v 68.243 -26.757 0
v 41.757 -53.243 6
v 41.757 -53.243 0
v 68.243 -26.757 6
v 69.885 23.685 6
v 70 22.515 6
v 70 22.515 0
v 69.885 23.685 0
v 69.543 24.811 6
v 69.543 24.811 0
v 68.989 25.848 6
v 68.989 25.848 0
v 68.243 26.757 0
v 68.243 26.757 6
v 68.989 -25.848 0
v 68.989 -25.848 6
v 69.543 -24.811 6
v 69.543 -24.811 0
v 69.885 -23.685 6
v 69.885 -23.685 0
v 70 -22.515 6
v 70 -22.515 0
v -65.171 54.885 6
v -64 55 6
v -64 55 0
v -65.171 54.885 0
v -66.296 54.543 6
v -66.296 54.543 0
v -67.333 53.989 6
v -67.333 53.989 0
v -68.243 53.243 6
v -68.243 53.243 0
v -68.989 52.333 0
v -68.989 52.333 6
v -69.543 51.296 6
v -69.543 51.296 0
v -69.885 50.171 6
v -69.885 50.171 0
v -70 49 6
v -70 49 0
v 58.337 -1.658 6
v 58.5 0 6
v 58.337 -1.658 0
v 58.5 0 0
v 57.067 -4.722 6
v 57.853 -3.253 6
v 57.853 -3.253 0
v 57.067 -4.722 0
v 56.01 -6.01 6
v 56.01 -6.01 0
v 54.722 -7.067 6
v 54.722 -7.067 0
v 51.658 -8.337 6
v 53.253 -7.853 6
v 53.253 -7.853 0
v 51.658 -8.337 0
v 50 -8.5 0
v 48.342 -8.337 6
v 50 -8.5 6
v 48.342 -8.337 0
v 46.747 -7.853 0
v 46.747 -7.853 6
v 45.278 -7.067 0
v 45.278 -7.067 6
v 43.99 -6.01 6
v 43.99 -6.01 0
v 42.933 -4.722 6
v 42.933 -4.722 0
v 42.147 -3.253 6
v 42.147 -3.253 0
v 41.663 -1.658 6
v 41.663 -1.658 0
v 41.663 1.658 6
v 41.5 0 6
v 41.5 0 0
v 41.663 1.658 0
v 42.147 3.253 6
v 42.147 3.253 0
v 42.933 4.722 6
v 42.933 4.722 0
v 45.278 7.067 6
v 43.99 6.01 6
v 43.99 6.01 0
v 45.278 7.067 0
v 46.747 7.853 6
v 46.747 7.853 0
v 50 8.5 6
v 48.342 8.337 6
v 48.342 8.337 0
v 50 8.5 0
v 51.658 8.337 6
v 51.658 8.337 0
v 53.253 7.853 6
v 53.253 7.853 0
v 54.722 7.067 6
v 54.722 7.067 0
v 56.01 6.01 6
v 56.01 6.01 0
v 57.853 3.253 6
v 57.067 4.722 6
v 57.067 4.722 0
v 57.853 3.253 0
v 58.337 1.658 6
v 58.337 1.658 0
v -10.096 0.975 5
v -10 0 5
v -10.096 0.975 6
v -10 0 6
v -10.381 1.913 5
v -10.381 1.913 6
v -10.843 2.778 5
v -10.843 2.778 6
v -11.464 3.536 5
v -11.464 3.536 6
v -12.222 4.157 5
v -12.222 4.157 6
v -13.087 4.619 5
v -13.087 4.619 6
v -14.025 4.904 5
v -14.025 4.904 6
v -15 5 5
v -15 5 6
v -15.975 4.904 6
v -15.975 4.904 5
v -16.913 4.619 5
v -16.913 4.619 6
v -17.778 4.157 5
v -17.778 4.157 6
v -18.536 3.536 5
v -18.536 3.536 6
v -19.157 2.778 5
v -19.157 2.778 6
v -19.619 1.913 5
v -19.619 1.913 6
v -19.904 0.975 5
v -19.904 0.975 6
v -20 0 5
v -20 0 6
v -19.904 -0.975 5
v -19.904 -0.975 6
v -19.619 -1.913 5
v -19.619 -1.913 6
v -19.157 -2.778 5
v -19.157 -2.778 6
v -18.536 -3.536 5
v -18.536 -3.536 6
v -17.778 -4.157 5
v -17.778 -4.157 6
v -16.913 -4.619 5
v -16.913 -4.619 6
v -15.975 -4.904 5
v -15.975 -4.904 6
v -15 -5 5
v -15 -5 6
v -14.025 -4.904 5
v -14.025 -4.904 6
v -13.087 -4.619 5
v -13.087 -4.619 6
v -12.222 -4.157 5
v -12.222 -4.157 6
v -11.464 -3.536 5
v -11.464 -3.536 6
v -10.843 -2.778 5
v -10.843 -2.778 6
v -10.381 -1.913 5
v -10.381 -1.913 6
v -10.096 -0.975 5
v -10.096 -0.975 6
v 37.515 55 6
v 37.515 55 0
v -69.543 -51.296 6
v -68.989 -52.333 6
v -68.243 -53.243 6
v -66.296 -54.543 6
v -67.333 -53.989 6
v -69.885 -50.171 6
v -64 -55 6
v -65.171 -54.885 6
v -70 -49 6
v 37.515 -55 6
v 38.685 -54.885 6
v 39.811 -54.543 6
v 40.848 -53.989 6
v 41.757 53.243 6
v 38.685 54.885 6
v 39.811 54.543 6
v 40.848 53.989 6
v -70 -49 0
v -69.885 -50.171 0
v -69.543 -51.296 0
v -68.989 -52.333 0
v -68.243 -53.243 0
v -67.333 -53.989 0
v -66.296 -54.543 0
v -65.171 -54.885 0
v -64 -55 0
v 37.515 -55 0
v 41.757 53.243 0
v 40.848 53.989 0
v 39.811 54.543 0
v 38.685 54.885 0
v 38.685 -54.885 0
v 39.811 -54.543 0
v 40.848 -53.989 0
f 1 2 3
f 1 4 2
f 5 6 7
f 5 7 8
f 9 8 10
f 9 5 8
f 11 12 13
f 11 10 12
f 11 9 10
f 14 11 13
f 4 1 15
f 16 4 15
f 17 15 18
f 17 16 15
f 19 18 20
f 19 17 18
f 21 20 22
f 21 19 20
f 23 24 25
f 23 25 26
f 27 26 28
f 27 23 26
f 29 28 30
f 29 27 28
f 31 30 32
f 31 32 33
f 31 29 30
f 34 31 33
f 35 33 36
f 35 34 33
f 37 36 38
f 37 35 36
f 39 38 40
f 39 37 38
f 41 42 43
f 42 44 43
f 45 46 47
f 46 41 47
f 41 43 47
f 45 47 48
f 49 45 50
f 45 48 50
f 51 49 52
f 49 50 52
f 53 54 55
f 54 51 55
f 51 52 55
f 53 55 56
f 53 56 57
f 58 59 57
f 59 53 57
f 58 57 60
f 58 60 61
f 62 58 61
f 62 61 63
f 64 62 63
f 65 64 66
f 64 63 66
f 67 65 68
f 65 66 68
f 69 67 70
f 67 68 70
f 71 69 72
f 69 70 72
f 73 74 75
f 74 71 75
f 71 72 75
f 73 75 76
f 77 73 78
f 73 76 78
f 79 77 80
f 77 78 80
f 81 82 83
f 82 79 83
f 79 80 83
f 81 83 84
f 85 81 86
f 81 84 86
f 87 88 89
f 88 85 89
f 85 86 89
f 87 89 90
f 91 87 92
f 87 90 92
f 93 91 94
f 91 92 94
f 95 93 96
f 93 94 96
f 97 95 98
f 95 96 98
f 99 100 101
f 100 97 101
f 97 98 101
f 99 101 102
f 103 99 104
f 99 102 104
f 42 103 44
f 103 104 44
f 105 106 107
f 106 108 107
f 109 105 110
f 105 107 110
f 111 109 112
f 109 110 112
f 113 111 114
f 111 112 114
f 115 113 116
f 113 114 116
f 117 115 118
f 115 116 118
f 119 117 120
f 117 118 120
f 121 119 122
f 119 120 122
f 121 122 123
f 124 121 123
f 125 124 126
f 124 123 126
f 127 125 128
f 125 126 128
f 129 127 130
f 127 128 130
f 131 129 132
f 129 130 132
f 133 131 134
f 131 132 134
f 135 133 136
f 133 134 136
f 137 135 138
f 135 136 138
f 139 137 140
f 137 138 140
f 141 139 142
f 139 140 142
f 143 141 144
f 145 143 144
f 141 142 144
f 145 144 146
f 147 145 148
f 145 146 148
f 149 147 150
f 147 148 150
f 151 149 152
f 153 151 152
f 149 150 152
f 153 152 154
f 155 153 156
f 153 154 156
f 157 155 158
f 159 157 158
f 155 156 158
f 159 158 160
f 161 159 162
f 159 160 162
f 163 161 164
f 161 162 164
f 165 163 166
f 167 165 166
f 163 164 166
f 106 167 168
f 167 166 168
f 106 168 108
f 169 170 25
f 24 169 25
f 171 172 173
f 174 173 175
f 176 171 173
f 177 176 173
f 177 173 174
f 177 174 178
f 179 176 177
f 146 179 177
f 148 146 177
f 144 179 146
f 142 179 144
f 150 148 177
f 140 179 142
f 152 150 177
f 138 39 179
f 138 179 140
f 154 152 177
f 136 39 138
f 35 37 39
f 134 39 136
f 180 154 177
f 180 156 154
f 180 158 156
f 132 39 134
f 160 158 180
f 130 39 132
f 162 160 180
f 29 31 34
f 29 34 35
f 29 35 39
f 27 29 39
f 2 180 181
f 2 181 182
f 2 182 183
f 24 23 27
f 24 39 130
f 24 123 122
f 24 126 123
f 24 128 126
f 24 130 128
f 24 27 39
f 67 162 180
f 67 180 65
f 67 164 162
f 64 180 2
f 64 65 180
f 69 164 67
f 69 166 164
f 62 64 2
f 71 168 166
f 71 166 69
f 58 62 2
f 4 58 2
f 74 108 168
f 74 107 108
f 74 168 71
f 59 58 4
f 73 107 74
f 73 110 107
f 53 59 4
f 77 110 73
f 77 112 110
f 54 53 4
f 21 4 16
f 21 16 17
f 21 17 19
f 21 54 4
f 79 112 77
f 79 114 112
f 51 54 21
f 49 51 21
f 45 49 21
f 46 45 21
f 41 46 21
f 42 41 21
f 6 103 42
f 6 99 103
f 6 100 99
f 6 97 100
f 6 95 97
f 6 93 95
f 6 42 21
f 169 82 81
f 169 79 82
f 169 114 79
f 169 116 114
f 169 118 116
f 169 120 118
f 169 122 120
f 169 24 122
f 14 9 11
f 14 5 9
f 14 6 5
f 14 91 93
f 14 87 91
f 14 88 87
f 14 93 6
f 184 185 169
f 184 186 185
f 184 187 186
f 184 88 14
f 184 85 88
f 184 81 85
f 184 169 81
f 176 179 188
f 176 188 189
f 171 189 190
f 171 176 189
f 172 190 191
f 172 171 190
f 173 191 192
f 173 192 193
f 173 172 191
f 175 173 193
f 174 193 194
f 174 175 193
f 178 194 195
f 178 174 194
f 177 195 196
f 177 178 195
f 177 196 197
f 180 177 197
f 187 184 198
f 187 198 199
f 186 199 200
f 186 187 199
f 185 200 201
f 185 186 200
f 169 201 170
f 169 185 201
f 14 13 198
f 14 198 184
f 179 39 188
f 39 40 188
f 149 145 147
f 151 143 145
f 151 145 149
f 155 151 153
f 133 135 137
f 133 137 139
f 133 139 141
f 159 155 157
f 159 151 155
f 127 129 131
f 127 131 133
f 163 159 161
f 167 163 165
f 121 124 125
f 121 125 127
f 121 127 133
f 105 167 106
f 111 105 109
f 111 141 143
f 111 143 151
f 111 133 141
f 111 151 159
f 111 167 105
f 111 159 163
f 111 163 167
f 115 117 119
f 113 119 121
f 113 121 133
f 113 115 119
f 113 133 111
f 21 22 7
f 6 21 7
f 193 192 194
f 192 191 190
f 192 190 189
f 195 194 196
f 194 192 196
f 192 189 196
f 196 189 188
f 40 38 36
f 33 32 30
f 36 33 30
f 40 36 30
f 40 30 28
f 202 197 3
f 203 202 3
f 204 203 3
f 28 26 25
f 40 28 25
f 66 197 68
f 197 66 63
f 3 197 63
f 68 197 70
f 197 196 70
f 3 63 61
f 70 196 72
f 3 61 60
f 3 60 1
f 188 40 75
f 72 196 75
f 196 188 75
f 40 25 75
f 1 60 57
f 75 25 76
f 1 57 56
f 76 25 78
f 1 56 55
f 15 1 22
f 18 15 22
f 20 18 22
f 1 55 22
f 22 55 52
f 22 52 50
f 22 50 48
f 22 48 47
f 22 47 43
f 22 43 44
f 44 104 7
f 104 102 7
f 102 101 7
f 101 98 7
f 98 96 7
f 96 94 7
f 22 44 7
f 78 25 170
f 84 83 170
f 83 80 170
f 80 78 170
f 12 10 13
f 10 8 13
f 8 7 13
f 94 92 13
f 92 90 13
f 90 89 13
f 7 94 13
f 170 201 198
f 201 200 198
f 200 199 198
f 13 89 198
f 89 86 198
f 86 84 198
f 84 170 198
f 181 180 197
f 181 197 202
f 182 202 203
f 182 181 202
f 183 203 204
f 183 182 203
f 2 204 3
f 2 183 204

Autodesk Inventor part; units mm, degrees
ref_plane "YZ Plane" through (0, 0, 0) normal (1, 0, 0) x (0, 1, 0)
ref_plane "XZ Plane" through (0, 0, 0) normal (0, 1, 0) x (-1, 0, 0)
ref_plane "XY Plane" through (0, 0, 0) normal (0, 0, 1) x (1, 0, 0)
sketch "Sketch1" plane through (0, 0, 0) normal (0, 0, 1) x (1, 0, 0)
  line L0 (-70, -55) -> (70, -55)
  line L1 (70, -55) -> (70, 55)
  line L2 (70, 55) -> (-70, 55)
  line L3 (-70, 55) -> (-70, -55)
  line L4 (-70, -55) -> (70, 55) construction
  line L5 (70, -55) -> (-70, 55) construction
  circle A0 centre (50, -35) radius 8.5
  circle A1 centre (50, 35) radius 8.5
  line L6 (0, 0) -> (70, 0) construction
  circle A2 centre (50, 0) radius 8.5
  dimension "d0" = 140
  dimension "d1" = 110
  dimension "d23" = 17
  dimension "d25" = 20
  dimension "d26" = 20
extrude "Plate1" add sketch "Sketch1" along normal blind 6 contours L3 L2 L1 L0 | A0 | A1
sketch "Sketch5" plane through (0, 0, 6) normal (0, 0, 1) x (1, 0, 0)
  line L0 (70, -55) -> (-70, -55) projected
  line L1 (-70, -55) -> (-70, 55) projected
  line L2 (-70, 55) -> (70, 55) projected
  circle A0 centre (-15, 0) radius 55
  circle A1 centre (-15, 0) radius 5
  point P0 (0, 0)
  point P1 (50, -55)
  point P2 (-50, -55)
  point P3 (-70, -35)
  point P4 (-70, 35)
  point P5 (-50, 55)
  point P6 (50, 55)
  dimension "d27" = 10
extrude "Extrusion2" cut sketch "Sketch5" against normal blind 1 contours A1
chamfer "Corner Chamfer2" distance 30 angle 45 2 edges at (70, -55, 3) (70, 55, 3)
fillet "Corner Round2" radius 6 6 edges at (40, -55, 3) (70, -25, 3) (70, 25, 3) (40, 55, 3) (-70, 55, 3) (-70, -55, 3)
equation "\"d26\" = d25"
equation "\"d2\" = Thickness"
equation "\"BendReliefWidth\" = Thickness"
equation "\"BendReliefDepth\" = 0.5 * Thickness"
equation "\"CornerReliefSize\" = 4 * Thickness"
equation "\"MinimumRemnant\" = 2 * Thickness"
equation "\"TransitionRadius\" = BendRadius"
equation "\"JacobiRadiusSize\" = BendRadius"
equation "\"GapSize\" = Thickness"
equation "\"Thickness\" = 6"
equation "\"BendRadius\" = 5"
properties part number "PNS-683 leg floor plate" material "Stainless Steel"
